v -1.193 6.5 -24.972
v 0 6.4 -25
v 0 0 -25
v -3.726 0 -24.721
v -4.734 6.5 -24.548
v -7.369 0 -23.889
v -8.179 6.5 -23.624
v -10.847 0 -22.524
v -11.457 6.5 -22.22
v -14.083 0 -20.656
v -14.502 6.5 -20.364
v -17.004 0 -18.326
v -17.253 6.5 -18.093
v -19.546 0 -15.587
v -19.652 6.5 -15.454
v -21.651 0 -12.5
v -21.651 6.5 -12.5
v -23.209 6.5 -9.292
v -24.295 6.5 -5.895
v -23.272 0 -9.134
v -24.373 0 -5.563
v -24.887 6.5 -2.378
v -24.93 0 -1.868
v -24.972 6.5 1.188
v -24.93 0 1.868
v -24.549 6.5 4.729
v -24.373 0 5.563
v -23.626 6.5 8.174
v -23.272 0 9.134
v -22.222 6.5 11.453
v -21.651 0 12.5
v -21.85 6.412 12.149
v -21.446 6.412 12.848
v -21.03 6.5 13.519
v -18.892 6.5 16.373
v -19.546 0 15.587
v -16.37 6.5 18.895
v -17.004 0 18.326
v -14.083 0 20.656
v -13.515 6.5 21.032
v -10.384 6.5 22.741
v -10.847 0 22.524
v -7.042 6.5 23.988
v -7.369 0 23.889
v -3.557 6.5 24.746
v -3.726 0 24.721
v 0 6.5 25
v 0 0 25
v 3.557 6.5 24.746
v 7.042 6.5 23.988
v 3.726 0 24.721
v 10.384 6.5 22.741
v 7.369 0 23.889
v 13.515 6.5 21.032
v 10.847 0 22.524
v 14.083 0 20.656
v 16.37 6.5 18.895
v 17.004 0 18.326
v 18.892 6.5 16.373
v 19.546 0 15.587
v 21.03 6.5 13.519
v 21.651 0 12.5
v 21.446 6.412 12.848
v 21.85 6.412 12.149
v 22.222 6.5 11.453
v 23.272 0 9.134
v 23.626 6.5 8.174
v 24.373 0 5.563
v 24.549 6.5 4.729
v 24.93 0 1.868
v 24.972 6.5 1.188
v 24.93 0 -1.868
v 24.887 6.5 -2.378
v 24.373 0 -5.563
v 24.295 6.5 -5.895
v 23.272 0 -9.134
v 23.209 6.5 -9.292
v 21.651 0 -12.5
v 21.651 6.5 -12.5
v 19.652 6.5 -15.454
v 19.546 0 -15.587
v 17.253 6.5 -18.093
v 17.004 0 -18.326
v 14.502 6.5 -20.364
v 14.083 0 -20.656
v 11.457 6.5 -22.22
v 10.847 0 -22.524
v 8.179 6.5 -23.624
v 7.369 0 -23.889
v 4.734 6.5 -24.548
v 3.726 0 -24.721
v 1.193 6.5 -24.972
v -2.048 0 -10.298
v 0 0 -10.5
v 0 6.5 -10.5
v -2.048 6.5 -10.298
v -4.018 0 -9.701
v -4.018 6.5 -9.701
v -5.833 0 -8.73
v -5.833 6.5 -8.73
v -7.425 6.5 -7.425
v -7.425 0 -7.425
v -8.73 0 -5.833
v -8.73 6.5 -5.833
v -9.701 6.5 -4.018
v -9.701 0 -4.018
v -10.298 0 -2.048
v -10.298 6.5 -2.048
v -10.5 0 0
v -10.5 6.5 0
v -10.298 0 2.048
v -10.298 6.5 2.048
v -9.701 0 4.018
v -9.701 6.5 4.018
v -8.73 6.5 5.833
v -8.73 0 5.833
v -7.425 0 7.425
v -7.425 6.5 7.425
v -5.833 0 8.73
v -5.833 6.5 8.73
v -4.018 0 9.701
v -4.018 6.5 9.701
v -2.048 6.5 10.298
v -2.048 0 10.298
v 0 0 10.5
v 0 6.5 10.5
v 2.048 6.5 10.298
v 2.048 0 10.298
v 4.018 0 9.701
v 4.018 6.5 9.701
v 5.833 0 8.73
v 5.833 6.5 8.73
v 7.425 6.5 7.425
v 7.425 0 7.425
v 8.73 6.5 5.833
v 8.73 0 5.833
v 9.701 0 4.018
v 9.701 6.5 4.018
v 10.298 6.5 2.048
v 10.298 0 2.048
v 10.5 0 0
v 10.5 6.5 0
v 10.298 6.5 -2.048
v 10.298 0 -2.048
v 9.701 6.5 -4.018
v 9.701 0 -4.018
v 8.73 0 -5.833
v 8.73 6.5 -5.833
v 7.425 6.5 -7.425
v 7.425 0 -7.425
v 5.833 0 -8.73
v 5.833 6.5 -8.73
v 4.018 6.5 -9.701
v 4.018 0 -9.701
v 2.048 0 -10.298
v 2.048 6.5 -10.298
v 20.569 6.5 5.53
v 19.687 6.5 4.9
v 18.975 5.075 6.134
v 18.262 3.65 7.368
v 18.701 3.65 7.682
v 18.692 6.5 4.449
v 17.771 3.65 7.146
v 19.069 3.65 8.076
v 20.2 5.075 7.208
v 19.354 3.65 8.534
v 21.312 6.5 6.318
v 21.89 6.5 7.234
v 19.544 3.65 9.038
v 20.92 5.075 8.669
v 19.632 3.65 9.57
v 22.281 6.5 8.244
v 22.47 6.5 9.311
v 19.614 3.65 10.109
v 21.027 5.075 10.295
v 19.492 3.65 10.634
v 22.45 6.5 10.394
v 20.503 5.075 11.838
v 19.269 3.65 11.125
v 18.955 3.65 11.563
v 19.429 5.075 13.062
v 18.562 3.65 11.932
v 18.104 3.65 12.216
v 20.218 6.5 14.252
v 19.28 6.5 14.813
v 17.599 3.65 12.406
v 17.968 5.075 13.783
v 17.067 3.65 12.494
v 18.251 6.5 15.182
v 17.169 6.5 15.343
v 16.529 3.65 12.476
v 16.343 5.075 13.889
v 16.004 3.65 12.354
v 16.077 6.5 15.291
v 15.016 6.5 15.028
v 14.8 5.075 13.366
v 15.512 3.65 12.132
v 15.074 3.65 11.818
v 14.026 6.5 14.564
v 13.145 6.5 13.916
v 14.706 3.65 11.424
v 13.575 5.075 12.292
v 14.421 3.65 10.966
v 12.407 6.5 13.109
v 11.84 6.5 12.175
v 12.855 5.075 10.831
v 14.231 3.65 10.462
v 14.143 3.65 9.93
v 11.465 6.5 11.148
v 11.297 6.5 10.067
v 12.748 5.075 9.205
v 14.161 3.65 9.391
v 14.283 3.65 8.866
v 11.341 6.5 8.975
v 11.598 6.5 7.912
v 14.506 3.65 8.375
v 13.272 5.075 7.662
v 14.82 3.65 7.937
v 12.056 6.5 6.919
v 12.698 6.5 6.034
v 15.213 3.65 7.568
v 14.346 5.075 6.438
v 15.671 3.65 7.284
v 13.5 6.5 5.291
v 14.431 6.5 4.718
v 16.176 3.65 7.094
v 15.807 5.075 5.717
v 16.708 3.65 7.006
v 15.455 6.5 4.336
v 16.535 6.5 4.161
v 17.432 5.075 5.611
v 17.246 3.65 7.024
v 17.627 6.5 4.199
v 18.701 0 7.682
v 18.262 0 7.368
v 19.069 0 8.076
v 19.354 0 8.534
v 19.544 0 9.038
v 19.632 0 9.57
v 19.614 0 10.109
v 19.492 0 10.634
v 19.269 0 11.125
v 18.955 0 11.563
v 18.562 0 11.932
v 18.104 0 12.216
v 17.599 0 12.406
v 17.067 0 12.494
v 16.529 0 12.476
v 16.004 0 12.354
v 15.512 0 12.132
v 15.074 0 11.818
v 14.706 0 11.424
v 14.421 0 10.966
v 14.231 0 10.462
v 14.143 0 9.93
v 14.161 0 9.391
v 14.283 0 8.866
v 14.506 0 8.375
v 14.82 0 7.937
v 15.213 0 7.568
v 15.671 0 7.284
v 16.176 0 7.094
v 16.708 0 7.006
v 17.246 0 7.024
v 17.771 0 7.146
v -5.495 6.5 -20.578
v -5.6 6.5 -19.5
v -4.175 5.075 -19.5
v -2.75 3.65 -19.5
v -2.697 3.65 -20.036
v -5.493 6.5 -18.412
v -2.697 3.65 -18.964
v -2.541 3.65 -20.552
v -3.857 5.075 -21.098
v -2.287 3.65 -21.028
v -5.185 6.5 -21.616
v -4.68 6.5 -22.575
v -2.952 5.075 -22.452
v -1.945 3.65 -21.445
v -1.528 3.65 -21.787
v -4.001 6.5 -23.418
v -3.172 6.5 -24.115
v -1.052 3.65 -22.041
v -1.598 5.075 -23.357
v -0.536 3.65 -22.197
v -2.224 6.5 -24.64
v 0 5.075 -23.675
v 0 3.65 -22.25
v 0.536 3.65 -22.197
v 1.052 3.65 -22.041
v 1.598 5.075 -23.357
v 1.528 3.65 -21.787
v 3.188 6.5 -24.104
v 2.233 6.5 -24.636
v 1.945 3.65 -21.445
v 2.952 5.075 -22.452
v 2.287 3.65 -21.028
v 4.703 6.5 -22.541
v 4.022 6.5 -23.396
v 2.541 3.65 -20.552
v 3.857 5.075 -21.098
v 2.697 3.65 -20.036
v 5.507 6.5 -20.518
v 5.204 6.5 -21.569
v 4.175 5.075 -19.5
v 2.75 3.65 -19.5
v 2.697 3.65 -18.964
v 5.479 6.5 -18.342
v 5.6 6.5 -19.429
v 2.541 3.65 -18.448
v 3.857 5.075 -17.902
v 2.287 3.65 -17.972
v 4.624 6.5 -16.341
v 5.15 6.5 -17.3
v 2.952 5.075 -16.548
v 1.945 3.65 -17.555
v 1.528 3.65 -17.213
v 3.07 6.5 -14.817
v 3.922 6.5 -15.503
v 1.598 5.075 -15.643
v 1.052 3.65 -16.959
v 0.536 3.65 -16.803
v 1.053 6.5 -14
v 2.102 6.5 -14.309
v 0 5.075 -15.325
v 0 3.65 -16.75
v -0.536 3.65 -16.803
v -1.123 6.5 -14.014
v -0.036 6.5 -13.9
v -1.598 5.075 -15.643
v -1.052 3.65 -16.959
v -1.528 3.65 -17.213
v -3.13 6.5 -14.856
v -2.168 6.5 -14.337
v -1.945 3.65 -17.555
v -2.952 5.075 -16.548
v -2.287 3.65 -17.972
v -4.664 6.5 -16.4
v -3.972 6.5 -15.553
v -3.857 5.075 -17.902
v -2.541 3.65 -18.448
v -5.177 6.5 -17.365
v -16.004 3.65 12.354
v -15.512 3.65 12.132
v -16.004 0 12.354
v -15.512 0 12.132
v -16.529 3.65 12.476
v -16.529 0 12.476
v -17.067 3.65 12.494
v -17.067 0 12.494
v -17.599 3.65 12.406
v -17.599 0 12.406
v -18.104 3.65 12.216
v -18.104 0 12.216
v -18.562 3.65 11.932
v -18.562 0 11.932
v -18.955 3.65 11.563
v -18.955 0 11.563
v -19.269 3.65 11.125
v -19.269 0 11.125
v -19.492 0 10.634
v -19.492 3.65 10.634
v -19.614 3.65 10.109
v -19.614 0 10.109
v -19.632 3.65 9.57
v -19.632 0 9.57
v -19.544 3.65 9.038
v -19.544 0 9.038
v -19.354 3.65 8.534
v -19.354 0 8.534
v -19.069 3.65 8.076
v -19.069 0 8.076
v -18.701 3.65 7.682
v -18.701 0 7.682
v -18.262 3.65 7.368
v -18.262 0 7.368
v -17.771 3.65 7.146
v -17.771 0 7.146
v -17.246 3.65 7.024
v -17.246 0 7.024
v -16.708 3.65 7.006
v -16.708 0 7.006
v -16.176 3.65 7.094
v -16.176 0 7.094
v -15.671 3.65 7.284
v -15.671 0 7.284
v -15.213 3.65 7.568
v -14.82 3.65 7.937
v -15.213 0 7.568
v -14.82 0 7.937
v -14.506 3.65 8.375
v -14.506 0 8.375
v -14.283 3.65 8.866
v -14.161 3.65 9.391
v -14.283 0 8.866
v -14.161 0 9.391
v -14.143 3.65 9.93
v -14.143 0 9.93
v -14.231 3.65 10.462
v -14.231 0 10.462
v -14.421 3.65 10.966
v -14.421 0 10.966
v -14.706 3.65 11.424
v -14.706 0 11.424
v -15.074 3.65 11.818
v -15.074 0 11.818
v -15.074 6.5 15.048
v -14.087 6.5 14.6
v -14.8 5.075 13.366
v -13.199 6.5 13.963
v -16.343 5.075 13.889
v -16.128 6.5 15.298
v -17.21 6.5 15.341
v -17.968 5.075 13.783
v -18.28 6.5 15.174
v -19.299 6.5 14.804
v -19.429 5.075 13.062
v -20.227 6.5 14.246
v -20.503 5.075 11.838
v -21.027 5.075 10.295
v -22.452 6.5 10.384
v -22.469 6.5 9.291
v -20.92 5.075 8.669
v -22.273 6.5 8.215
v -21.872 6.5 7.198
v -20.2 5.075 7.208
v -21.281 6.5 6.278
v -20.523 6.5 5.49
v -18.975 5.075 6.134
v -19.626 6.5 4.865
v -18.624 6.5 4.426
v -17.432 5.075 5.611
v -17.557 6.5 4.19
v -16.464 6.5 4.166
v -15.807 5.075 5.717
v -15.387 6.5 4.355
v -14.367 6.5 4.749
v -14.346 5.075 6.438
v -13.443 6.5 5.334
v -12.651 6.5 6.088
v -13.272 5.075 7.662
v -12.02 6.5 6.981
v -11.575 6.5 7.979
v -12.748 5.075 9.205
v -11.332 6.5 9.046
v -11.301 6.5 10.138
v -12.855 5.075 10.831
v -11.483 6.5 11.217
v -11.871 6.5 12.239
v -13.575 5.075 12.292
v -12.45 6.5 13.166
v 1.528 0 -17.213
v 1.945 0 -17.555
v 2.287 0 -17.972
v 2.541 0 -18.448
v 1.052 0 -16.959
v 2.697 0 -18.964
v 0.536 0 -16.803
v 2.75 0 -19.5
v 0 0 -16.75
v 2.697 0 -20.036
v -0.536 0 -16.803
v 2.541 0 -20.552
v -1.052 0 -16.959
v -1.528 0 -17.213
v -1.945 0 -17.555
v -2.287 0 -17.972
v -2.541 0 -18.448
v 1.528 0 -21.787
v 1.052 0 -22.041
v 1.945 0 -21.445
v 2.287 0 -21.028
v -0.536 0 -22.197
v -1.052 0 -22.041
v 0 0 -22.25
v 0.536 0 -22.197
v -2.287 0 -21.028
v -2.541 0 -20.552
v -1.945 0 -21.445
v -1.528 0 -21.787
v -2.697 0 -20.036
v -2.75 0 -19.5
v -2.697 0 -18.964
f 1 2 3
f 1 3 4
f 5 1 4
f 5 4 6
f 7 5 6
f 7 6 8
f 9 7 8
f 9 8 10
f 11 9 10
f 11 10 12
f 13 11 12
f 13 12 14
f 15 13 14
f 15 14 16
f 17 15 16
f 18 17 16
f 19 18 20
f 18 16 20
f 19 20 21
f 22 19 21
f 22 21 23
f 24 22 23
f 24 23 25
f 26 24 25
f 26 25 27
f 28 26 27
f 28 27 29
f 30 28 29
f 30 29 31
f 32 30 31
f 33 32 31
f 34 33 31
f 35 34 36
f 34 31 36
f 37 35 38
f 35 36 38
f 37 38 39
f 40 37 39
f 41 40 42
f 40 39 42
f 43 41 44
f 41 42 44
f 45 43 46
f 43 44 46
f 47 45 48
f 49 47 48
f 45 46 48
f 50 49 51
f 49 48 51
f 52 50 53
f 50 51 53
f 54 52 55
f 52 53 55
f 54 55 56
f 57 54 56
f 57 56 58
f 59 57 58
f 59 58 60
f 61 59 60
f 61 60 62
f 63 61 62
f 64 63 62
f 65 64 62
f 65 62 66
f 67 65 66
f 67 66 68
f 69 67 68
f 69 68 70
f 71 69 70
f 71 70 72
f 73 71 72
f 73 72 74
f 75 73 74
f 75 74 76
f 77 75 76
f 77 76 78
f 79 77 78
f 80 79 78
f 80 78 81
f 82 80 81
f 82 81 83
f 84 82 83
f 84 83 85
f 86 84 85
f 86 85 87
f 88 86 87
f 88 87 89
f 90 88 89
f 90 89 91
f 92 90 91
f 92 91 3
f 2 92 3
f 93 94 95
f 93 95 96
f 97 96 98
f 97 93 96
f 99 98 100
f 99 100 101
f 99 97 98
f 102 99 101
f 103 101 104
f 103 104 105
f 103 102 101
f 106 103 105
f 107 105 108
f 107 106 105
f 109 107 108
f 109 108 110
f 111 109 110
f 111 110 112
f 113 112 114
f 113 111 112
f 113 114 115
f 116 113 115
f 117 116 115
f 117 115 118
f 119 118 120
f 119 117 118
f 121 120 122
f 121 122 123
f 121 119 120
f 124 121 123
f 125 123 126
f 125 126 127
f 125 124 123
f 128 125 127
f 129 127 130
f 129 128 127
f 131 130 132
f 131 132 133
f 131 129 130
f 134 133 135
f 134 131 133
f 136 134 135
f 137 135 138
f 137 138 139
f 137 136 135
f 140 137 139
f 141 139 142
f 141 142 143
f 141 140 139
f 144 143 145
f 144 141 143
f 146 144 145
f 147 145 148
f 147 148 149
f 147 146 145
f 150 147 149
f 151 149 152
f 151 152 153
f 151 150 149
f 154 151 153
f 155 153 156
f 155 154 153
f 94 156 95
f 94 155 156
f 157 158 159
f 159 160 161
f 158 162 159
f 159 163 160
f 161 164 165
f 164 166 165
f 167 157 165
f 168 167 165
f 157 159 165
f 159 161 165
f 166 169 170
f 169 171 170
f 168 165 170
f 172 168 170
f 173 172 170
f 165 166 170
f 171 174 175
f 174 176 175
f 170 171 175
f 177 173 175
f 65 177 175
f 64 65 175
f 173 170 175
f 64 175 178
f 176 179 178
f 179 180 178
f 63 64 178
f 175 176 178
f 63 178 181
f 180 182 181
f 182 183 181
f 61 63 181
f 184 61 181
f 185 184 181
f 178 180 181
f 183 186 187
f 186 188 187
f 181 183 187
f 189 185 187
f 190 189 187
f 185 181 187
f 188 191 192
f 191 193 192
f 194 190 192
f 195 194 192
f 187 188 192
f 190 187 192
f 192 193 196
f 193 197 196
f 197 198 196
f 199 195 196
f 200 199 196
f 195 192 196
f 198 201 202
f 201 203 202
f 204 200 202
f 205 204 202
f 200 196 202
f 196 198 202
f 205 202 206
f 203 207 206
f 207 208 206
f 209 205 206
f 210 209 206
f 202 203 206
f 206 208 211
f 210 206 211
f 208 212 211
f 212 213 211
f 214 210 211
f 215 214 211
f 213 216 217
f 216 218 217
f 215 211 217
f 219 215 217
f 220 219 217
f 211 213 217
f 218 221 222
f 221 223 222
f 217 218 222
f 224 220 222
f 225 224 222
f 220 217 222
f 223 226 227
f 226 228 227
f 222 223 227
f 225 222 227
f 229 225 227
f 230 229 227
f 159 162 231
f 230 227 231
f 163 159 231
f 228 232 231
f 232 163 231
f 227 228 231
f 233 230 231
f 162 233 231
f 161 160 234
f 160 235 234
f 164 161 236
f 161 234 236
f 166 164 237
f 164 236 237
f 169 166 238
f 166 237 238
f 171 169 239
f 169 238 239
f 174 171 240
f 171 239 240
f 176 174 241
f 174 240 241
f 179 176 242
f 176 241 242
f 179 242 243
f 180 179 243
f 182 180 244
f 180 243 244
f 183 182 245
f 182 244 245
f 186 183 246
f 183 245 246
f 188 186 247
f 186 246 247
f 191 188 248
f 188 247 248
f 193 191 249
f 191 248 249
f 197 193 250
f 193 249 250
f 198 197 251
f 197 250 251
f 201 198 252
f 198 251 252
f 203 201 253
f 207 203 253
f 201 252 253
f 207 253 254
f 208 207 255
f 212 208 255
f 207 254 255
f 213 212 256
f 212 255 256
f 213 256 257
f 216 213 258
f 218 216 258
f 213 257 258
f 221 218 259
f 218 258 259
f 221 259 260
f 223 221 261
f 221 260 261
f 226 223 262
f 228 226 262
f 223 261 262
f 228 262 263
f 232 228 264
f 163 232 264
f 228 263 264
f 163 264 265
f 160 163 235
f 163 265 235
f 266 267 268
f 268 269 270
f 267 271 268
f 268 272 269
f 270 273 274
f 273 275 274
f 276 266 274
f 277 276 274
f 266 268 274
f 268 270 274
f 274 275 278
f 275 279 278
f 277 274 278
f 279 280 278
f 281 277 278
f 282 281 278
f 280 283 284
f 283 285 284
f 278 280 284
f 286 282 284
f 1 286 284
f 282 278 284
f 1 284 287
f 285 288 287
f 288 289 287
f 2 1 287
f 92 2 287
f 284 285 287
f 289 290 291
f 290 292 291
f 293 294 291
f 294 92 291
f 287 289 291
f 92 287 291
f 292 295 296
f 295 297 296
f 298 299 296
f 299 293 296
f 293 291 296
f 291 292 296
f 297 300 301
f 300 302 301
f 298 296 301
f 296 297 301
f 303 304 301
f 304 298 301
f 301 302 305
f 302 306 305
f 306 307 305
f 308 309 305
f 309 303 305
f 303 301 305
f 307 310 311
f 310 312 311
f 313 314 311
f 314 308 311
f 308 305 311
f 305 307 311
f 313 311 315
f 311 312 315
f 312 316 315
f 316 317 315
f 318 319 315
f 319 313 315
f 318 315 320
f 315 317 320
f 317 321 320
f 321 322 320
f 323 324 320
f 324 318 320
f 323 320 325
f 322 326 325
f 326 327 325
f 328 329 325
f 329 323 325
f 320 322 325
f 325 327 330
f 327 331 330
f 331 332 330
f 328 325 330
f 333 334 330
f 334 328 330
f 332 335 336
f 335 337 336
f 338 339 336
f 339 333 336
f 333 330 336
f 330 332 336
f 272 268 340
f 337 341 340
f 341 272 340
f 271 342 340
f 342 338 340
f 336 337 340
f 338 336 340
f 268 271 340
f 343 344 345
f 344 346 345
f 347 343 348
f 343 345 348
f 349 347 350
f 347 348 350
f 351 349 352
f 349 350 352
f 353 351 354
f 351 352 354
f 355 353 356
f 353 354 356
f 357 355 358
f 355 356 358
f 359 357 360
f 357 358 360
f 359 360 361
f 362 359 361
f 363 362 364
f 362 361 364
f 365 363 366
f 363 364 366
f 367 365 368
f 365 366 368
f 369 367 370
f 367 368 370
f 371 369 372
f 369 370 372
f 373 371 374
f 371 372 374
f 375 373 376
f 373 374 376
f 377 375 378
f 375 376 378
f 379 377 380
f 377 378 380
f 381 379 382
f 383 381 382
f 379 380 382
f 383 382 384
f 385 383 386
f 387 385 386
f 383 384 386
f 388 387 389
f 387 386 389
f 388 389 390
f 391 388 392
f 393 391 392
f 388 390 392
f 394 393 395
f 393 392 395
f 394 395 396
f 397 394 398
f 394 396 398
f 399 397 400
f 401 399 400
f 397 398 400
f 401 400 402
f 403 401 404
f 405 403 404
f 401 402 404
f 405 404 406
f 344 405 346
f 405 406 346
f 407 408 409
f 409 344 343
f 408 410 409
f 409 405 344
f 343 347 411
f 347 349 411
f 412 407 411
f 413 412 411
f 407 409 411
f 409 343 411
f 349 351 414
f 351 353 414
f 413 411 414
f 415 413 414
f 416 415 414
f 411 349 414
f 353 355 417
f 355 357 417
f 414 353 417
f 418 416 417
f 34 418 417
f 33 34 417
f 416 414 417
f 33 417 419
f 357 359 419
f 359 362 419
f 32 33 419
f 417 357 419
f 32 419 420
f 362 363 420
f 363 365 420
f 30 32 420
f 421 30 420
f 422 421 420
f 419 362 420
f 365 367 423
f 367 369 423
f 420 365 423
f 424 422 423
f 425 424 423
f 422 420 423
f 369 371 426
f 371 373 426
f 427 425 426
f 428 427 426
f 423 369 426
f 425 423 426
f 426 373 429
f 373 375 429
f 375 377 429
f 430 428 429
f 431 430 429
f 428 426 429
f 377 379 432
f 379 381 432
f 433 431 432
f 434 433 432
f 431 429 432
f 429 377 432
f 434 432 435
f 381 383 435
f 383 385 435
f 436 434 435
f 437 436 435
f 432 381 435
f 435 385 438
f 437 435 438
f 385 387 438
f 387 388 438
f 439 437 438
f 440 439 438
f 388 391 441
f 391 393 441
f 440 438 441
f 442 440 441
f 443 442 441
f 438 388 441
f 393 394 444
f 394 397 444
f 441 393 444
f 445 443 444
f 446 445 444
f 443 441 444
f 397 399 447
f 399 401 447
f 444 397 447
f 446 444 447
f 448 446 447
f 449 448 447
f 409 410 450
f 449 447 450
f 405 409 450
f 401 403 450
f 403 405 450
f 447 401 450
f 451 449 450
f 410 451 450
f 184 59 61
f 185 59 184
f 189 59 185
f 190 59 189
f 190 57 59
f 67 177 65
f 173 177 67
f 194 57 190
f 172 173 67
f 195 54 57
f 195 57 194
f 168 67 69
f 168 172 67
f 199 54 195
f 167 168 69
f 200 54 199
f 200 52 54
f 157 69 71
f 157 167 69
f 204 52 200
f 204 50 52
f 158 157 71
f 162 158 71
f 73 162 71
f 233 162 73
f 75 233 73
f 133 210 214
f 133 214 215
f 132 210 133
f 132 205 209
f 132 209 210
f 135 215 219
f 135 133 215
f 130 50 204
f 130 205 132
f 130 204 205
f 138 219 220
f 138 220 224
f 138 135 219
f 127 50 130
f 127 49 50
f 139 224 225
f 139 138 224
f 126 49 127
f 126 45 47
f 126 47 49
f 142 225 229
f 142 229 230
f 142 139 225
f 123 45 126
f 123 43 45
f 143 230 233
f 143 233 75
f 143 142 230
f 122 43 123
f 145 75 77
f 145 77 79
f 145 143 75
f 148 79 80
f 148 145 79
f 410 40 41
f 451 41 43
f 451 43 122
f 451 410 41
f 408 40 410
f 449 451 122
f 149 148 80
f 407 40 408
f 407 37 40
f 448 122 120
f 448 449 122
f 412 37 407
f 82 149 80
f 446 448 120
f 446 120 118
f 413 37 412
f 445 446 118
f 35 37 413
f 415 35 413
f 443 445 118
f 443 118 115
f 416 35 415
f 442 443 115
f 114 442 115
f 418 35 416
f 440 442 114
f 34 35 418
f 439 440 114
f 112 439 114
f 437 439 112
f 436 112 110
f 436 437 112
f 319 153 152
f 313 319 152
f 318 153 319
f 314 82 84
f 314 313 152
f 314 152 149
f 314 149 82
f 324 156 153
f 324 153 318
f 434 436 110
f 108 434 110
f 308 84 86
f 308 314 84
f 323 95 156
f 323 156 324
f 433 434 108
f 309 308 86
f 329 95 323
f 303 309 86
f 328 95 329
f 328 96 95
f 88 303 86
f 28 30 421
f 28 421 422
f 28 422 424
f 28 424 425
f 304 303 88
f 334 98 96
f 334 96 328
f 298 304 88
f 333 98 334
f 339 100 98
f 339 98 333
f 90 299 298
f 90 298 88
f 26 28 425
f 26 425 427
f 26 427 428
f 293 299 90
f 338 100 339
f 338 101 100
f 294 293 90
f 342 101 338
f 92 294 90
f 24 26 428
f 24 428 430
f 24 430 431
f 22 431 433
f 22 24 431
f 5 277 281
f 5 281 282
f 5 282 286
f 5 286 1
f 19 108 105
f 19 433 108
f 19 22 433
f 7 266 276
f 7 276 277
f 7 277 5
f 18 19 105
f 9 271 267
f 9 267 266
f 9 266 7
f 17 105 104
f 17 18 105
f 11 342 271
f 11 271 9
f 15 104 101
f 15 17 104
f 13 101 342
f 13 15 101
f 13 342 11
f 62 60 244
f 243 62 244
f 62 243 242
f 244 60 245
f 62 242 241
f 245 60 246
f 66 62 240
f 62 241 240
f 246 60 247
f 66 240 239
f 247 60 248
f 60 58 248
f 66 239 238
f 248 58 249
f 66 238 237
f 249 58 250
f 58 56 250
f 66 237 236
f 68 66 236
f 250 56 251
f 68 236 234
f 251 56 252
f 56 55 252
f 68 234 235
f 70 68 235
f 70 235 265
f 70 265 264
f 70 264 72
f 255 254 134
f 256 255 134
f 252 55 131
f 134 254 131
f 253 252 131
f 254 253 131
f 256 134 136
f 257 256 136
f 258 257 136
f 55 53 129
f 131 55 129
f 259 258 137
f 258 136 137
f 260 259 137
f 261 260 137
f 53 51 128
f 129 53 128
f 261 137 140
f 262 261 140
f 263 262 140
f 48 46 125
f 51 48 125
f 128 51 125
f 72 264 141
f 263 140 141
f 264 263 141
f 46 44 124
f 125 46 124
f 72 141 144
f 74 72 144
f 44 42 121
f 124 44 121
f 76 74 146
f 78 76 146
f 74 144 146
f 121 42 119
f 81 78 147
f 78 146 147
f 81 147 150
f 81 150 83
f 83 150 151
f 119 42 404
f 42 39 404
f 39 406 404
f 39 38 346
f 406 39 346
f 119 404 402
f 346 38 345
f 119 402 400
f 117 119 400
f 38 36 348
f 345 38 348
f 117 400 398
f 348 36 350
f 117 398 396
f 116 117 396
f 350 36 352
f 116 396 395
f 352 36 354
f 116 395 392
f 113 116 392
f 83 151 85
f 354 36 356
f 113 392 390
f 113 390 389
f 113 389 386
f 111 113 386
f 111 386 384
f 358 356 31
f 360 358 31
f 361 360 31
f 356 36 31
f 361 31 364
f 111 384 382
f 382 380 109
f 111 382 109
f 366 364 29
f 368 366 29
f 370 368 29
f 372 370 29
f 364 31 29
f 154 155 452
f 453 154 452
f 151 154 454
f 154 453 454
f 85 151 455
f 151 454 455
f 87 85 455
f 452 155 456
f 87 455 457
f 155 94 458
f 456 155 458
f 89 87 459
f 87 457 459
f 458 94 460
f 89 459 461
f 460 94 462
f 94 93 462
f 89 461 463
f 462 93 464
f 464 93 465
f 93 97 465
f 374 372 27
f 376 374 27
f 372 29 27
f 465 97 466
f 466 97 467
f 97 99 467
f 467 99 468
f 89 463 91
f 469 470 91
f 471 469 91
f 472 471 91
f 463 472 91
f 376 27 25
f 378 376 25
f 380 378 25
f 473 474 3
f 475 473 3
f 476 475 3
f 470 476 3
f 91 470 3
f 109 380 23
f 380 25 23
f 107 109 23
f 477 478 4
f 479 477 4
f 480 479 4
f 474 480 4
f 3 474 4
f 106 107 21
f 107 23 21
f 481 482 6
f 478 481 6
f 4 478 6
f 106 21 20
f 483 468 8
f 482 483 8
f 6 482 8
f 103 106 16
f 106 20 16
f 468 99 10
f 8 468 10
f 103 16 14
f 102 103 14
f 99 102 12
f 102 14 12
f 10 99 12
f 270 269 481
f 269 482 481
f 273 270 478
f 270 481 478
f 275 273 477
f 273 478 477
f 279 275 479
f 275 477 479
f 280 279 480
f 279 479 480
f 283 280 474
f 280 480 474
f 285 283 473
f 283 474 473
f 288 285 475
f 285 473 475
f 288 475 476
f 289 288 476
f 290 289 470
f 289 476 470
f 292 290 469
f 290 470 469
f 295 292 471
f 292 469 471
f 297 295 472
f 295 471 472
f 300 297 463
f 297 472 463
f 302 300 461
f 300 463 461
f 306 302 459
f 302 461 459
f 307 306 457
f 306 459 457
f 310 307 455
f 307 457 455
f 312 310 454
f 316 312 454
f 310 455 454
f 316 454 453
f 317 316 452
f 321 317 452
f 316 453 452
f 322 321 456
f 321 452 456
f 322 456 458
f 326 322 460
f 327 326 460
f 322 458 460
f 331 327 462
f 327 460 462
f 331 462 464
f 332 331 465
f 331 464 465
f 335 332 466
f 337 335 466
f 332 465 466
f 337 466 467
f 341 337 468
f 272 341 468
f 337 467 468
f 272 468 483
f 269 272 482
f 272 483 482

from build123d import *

# Parameters (mm, degrees)
SKETCH1_R                     = 25
SKETCH1_R_2                   = 10.5
BOSS_EXTRUDE1_DEPTH           = 6.5
CSK_FOR_M5_SFHCS1_D           = 5.5
CSK_FOR_M5_SFHCS1_CSINK_D     = 11.2
CSK_FOR_M5_SFHCS1_CSINK_ANGLE = 90
CIRPATTERN1_COUNT             = 3


with BuildPart() as part:
    # Sketch1 → Boss-Extrude1 (new body)
    with BuildSketch(Plane(origin=(0, 0, 0), x_dir=(1, 0, 0), z_dir=(0, 1, 0))):
        with Locations(Location((0, 0, 0), (0, 0, 90))):
            Circle(SKETCH1_R)
        with Locations(Location((0, 0, 0), (0, 0, 90))):
            Circle(SKETCH1_R_2, mode=Mode.SUBTRACT)
    extrude(amount=BOSS_EXTRUDE1_DEPTH)

    # CSK for M5 SFHCS1 (through all)
    with Locations(Plane(origin=(0, 6.5, 0), x_dir=(1, 0, 0), z_dir=(0, 1, 0))):
        with Locations((0, 19.5)):
            csk_for_m5_sfhcs1 = CounterSinkHole(CSK_FOR_M5_SFHCS1_D / 2, CSK_FOR_M5_SFHCS1_CSINK_D / 2, counter_sink_angle=CSK_FOR_M5_SFHCS1_CSINK_ANGLE)

    # CirPattern1: CSK for M5 SFHCS1 ×3 about axis
    cirpattern1_axis = Axis((0, 0, 0), (0, 1, 0))
    for i in range(1, CIRPATTERN1_COUNT):
        add(csk_for_m5_sfhcs1.rotate(cirpattern1_axis, i * 360 / CIRPATTERN1_COUNT), mode=Mode.SUBTRACT)


solid = part.part
